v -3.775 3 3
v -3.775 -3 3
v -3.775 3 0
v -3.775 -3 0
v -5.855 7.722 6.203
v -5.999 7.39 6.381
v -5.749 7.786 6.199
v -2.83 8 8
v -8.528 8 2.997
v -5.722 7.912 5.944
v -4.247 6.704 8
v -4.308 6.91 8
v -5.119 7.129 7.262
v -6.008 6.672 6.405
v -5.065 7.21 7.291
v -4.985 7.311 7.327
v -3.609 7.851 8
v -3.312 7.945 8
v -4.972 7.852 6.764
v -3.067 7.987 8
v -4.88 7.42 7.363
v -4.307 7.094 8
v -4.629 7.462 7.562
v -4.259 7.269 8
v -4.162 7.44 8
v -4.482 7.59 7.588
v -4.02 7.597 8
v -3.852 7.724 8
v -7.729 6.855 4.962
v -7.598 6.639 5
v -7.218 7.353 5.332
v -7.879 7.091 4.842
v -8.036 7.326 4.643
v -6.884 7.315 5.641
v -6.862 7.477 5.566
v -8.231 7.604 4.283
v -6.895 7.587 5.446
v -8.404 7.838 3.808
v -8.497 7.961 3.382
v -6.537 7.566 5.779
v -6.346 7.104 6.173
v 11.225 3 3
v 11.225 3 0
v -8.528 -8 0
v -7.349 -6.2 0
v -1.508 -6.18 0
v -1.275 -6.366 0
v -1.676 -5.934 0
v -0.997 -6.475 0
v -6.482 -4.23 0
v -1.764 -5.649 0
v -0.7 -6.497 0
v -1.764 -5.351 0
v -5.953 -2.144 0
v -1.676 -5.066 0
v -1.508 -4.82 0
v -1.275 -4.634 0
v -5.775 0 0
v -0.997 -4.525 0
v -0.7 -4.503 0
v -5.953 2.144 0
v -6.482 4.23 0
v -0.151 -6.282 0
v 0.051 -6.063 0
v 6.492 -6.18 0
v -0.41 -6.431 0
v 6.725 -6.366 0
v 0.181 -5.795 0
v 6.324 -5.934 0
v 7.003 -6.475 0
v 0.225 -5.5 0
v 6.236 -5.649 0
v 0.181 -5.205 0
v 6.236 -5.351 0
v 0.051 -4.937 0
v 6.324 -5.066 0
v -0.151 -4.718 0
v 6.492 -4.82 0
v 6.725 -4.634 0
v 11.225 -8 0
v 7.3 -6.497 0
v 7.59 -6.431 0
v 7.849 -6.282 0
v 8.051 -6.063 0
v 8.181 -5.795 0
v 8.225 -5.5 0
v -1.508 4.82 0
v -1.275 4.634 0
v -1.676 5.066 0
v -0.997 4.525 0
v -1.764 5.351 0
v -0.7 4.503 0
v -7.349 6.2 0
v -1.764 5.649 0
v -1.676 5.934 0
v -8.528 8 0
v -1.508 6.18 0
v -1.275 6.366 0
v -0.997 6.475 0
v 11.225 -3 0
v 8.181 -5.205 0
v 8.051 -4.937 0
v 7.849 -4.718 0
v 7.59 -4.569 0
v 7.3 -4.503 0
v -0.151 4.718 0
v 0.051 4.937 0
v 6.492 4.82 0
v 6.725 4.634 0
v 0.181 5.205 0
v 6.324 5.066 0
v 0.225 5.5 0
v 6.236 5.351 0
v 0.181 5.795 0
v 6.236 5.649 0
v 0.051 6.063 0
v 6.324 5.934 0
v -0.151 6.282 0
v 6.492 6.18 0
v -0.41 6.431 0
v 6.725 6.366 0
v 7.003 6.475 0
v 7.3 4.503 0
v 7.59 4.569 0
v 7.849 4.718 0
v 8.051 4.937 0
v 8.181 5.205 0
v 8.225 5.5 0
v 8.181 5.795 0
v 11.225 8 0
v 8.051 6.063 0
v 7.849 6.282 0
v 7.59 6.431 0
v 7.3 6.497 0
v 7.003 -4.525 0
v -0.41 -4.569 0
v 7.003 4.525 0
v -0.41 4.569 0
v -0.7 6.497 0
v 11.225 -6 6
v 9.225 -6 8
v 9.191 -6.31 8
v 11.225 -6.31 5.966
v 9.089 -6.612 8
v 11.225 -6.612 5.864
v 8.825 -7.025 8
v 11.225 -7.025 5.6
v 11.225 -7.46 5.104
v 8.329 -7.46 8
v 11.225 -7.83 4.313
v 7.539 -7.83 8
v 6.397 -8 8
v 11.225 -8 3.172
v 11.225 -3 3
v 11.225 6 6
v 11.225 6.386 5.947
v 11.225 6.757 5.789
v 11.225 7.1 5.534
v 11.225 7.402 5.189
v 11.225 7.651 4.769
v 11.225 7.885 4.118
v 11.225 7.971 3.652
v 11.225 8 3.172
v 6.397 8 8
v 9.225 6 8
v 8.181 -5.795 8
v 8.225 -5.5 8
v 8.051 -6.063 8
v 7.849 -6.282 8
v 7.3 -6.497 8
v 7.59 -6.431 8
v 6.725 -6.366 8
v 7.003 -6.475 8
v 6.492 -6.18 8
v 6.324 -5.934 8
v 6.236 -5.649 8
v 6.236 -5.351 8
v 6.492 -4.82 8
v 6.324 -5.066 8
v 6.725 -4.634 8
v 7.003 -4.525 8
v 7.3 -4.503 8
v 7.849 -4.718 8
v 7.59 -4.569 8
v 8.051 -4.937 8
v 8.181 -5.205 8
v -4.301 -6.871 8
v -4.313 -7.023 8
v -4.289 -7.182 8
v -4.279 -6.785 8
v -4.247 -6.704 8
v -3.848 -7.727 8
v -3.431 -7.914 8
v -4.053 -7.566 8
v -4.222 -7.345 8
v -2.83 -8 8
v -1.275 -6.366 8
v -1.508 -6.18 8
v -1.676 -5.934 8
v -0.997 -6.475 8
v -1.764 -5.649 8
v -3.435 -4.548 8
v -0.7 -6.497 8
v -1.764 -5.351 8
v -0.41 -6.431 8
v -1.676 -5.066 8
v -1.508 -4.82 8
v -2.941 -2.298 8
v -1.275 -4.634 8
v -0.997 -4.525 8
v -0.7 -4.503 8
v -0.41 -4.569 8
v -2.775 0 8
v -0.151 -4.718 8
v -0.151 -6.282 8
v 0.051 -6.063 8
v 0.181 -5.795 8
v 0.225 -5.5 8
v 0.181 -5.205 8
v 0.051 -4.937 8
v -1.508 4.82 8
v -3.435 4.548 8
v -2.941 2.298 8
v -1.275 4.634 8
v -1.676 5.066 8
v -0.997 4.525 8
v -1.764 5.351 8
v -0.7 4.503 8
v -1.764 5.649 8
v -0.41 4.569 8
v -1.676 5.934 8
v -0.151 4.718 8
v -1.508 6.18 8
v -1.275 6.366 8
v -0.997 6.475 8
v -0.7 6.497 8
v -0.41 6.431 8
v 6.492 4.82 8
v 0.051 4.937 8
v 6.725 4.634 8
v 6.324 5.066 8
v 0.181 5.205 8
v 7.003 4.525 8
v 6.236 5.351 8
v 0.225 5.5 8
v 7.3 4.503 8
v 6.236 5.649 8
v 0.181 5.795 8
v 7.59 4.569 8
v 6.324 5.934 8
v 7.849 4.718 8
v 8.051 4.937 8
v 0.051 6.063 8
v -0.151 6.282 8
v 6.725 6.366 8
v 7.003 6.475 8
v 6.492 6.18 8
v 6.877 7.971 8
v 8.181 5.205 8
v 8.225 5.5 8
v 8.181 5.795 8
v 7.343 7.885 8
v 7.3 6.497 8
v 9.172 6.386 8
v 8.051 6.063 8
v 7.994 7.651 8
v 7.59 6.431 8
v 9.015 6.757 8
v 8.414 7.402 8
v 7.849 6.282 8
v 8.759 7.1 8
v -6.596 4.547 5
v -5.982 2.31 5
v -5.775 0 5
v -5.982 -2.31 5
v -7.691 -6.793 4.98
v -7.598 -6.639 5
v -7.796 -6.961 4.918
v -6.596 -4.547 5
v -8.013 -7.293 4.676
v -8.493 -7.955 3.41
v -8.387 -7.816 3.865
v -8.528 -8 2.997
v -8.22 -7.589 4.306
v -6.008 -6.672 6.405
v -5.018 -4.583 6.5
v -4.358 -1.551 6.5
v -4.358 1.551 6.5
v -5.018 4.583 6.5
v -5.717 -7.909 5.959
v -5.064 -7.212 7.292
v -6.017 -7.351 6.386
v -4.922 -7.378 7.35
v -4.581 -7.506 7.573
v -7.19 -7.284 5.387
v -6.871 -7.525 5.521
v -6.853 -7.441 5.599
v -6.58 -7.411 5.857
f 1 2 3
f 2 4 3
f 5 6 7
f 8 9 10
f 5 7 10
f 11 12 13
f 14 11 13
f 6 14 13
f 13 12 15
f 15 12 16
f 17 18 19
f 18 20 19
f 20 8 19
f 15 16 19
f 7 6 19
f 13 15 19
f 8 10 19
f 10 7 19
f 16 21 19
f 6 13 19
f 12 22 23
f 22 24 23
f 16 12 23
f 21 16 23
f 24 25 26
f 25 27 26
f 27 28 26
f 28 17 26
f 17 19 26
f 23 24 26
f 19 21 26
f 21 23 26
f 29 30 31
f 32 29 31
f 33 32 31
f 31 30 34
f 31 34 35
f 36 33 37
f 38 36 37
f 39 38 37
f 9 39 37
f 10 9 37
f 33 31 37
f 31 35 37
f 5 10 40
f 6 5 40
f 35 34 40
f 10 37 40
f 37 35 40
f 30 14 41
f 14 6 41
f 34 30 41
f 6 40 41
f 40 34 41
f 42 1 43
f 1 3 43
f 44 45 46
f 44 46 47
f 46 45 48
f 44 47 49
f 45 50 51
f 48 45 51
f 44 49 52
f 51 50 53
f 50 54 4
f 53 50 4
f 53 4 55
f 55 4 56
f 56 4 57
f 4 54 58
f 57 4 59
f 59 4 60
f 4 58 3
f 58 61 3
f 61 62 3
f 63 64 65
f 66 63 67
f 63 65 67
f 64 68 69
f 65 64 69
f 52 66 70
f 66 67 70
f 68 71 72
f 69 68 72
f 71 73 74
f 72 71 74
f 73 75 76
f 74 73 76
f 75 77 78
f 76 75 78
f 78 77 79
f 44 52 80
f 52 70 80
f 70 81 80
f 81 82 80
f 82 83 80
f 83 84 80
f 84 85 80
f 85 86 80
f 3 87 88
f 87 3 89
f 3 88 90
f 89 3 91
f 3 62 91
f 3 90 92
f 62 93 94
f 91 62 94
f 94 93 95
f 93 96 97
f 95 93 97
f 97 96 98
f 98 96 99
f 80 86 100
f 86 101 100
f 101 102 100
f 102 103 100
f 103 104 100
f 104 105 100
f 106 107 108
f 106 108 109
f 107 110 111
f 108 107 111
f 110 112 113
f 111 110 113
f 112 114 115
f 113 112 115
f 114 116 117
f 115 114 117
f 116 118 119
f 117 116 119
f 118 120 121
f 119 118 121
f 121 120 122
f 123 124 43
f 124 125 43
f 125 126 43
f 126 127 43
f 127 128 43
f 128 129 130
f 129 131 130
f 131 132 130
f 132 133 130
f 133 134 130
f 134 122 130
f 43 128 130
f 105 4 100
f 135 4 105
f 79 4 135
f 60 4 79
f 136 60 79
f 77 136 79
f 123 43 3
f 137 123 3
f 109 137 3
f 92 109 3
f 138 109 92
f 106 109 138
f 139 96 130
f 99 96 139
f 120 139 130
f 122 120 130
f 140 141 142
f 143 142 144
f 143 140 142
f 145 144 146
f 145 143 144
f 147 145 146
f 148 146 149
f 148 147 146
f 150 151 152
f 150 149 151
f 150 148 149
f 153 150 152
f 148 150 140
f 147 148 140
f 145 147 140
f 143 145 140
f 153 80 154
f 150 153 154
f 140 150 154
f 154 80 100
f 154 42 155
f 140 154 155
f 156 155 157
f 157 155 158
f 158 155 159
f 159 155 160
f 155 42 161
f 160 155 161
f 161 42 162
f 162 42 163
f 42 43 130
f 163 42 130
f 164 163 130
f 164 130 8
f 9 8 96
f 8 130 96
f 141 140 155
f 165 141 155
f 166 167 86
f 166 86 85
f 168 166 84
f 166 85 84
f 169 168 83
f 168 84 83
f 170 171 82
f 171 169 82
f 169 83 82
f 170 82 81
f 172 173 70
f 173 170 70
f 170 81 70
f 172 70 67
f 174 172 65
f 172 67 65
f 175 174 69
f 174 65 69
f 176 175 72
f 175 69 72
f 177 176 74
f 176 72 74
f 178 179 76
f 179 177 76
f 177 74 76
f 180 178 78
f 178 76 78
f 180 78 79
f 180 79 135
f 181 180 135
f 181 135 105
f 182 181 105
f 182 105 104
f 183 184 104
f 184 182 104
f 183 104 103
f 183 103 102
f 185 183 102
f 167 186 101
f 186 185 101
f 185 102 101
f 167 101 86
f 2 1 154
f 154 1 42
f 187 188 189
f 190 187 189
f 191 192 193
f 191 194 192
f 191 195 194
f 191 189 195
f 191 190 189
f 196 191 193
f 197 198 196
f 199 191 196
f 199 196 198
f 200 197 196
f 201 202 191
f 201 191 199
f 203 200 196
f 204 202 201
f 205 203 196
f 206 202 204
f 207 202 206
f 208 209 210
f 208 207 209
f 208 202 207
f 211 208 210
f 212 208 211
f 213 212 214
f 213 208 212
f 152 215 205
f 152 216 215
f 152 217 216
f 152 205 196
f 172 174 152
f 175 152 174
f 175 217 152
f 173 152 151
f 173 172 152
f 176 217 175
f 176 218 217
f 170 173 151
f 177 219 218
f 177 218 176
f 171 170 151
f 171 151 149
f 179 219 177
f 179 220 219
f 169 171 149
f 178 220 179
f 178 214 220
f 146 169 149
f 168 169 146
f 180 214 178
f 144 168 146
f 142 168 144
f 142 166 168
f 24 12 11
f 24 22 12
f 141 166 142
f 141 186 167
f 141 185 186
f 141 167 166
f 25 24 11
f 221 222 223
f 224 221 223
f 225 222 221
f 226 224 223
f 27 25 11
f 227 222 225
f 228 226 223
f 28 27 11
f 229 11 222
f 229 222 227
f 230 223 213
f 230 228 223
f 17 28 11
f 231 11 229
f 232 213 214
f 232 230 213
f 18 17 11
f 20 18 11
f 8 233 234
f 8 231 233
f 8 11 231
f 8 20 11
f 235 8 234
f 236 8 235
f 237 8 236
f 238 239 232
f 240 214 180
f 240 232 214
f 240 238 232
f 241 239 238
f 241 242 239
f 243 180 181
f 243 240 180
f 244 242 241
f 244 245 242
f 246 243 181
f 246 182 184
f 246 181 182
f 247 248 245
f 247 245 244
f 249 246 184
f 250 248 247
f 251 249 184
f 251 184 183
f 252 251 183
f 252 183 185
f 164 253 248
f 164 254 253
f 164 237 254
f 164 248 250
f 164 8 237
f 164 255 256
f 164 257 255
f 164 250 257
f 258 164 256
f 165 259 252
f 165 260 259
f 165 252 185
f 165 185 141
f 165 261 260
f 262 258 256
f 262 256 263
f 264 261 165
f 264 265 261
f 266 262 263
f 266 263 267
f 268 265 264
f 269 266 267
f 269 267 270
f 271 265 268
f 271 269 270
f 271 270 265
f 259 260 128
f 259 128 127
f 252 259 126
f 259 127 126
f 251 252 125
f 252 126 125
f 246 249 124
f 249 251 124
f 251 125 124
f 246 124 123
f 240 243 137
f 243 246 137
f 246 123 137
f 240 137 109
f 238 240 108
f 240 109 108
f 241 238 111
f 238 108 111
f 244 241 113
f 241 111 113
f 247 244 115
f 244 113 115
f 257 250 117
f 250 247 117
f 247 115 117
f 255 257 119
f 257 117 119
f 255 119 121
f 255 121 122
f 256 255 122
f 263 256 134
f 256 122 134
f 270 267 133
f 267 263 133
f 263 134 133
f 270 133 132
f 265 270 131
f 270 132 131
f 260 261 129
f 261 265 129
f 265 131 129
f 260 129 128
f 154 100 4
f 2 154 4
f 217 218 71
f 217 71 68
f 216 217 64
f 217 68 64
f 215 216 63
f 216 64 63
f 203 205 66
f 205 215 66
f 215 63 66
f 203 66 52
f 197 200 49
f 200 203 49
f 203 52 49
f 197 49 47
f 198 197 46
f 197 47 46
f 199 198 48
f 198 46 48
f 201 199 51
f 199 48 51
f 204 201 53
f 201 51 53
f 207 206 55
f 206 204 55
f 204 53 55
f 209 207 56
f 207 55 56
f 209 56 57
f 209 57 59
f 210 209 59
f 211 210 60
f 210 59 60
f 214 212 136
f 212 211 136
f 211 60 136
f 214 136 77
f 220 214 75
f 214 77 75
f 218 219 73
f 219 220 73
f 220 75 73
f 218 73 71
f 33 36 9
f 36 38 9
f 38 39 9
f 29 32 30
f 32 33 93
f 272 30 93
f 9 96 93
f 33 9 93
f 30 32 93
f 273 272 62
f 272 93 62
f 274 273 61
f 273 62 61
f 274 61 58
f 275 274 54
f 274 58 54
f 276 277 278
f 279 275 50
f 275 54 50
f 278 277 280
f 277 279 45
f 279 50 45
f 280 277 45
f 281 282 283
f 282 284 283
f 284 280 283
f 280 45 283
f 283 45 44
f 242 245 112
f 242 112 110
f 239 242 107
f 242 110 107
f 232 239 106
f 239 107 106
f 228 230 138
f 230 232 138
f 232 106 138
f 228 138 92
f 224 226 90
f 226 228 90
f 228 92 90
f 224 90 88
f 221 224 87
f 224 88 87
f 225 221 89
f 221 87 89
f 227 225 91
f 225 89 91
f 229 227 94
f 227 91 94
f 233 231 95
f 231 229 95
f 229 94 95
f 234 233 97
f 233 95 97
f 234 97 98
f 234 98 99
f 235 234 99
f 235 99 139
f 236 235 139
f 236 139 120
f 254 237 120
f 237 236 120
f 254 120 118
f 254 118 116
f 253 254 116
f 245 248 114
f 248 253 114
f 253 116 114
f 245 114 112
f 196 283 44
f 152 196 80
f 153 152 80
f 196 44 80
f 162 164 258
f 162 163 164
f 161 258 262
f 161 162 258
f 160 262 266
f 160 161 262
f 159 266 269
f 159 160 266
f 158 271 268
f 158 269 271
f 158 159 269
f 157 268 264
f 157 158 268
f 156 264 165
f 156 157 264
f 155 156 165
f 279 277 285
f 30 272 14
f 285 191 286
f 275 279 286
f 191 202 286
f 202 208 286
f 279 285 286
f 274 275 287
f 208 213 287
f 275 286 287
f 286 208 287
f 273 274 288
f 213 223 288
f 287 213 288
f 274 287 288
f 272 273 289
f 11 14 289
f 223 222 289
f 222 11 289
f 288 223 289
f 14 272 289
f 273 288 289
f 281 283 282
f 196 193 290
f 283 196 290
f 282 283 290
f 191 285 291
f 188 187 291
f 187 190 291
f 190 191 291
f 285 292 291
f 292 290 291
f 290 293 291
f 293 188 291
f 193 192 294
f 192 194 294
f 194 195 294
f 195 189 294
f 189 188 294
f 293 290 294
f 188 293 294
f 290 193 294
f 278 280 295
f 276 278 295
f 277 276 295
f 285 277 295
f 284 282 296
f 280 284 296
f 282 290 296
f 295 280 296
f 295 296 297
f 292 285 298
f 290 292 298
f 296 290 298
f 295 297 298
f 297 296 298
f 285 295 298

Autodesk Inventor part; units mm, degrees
ref_plane "YZ Plane" through (0, 0, 0) normal (1, 0, 0) x (0, 1, 0)
ref_plane "XZ Plane" through (0, 0, 0) normal (0, 1, 0) x (-1, 0, 0)
ref_plane "XY Plane" through (0, 0, 0) normal (0, 0, 1) x (1, 0, 0)
sketch "Sketch1" plane through (0, 0, 0) normal (0, 0, 1) x (1, 0, 0)
  circle A0 centre (-0.7749, 5.5) radius 1 projected
  circle A1 centre (7.2251, 5.5) radius 1 projected
  circle A2 centre (-0.7749, -5.5) radius 1 projected
  circle A3 centre (7.2251, -5.5) radius 1 projected
  line L0 (11.2251, -3) -> (-3.7749, -3) projected
  line L1 (-3.7749, -3) -> (-3.7749, 3) projected
  line L2 (-3.7749, 3) -> (11.2251, 3) projected
  line L3 (11.2251, 3) -> (11.2251, 8) projected
  line L4 (11.2251, 8) -> (-8.528, 8) projected
  arc A4 (-8.528, -8) -> (-8.528, 8) centre (-18.7749, 0) ccw projected
  line L5 (-8.528, -8) -> (11.2251, -8) projected
  line L6 (11.2251, -8) -> (11.2251, -3) projected
  point P0 (0, 0)
extrude "Extrusion1" add sketch "Sketch1" along normal blind 3
sketch "Sketch2" plane through (0, 0, 3) normal (0, 0, 1) x (1, 0, 0)
  line L0 (11.2251, -8) -> (11.2251, -3) projected
  line L1 (11.2251, -3) -> (-3.7749, -3) projected
  line L2 (-3.7749, -3) -> (-3.7749, 3) projected
  line L3 (-3.7749, 3) -> (11.2251, 3) projected
  line L4 (11.2251, 3) -> (11.2251, 8) projected
  line L5 (11.2251, 8) -> (-8.528, 8) projected
  arc A0 (-8.528, -8) -> (-8.528, 8) centre (-18.7749, 0) ccw projected
  line L6 (-8.528, -8) -> (11.2251, -8) projected
  circle A1 centre (-0.7749, 5.5) radius 1 projected
  circle A2 centre (7.2251, 5.5) radius 1 projected
  circle A3 centre (-0.7749, -5.5) radius 1 projected
  circle A4 centre (7.2251, -5.5) radius 1 projected
  line L7 (11.2251, -8) -> (11.2251, -3) projected
  line L8 (11.2251, 3) -> (11.2251, 8) projected
  line L9 (11.2251, -8) -> (11.2251, 8)
  point P0 (0, 0)
extrude "Extrusion2" add sketch "Sketch2" along normal blind 5
chamfer "Chamfer1" distance 3 angle 45 1 edges at (-5.7749, 0, 8)
fillet "Fillet1" radius 1 2 edges at (-6.817, -8, 6.3872) (-6.817, 8, 6.3872)
chamfer "Chamfer2" distance 2 angle 45 1 edges at (11.2251, 0, 8)
fillet "Fillet2" radius 2 2 edges at (10.2251, -8, 7) (10.2251, 8, 7)
properties part number "armtip_2"
